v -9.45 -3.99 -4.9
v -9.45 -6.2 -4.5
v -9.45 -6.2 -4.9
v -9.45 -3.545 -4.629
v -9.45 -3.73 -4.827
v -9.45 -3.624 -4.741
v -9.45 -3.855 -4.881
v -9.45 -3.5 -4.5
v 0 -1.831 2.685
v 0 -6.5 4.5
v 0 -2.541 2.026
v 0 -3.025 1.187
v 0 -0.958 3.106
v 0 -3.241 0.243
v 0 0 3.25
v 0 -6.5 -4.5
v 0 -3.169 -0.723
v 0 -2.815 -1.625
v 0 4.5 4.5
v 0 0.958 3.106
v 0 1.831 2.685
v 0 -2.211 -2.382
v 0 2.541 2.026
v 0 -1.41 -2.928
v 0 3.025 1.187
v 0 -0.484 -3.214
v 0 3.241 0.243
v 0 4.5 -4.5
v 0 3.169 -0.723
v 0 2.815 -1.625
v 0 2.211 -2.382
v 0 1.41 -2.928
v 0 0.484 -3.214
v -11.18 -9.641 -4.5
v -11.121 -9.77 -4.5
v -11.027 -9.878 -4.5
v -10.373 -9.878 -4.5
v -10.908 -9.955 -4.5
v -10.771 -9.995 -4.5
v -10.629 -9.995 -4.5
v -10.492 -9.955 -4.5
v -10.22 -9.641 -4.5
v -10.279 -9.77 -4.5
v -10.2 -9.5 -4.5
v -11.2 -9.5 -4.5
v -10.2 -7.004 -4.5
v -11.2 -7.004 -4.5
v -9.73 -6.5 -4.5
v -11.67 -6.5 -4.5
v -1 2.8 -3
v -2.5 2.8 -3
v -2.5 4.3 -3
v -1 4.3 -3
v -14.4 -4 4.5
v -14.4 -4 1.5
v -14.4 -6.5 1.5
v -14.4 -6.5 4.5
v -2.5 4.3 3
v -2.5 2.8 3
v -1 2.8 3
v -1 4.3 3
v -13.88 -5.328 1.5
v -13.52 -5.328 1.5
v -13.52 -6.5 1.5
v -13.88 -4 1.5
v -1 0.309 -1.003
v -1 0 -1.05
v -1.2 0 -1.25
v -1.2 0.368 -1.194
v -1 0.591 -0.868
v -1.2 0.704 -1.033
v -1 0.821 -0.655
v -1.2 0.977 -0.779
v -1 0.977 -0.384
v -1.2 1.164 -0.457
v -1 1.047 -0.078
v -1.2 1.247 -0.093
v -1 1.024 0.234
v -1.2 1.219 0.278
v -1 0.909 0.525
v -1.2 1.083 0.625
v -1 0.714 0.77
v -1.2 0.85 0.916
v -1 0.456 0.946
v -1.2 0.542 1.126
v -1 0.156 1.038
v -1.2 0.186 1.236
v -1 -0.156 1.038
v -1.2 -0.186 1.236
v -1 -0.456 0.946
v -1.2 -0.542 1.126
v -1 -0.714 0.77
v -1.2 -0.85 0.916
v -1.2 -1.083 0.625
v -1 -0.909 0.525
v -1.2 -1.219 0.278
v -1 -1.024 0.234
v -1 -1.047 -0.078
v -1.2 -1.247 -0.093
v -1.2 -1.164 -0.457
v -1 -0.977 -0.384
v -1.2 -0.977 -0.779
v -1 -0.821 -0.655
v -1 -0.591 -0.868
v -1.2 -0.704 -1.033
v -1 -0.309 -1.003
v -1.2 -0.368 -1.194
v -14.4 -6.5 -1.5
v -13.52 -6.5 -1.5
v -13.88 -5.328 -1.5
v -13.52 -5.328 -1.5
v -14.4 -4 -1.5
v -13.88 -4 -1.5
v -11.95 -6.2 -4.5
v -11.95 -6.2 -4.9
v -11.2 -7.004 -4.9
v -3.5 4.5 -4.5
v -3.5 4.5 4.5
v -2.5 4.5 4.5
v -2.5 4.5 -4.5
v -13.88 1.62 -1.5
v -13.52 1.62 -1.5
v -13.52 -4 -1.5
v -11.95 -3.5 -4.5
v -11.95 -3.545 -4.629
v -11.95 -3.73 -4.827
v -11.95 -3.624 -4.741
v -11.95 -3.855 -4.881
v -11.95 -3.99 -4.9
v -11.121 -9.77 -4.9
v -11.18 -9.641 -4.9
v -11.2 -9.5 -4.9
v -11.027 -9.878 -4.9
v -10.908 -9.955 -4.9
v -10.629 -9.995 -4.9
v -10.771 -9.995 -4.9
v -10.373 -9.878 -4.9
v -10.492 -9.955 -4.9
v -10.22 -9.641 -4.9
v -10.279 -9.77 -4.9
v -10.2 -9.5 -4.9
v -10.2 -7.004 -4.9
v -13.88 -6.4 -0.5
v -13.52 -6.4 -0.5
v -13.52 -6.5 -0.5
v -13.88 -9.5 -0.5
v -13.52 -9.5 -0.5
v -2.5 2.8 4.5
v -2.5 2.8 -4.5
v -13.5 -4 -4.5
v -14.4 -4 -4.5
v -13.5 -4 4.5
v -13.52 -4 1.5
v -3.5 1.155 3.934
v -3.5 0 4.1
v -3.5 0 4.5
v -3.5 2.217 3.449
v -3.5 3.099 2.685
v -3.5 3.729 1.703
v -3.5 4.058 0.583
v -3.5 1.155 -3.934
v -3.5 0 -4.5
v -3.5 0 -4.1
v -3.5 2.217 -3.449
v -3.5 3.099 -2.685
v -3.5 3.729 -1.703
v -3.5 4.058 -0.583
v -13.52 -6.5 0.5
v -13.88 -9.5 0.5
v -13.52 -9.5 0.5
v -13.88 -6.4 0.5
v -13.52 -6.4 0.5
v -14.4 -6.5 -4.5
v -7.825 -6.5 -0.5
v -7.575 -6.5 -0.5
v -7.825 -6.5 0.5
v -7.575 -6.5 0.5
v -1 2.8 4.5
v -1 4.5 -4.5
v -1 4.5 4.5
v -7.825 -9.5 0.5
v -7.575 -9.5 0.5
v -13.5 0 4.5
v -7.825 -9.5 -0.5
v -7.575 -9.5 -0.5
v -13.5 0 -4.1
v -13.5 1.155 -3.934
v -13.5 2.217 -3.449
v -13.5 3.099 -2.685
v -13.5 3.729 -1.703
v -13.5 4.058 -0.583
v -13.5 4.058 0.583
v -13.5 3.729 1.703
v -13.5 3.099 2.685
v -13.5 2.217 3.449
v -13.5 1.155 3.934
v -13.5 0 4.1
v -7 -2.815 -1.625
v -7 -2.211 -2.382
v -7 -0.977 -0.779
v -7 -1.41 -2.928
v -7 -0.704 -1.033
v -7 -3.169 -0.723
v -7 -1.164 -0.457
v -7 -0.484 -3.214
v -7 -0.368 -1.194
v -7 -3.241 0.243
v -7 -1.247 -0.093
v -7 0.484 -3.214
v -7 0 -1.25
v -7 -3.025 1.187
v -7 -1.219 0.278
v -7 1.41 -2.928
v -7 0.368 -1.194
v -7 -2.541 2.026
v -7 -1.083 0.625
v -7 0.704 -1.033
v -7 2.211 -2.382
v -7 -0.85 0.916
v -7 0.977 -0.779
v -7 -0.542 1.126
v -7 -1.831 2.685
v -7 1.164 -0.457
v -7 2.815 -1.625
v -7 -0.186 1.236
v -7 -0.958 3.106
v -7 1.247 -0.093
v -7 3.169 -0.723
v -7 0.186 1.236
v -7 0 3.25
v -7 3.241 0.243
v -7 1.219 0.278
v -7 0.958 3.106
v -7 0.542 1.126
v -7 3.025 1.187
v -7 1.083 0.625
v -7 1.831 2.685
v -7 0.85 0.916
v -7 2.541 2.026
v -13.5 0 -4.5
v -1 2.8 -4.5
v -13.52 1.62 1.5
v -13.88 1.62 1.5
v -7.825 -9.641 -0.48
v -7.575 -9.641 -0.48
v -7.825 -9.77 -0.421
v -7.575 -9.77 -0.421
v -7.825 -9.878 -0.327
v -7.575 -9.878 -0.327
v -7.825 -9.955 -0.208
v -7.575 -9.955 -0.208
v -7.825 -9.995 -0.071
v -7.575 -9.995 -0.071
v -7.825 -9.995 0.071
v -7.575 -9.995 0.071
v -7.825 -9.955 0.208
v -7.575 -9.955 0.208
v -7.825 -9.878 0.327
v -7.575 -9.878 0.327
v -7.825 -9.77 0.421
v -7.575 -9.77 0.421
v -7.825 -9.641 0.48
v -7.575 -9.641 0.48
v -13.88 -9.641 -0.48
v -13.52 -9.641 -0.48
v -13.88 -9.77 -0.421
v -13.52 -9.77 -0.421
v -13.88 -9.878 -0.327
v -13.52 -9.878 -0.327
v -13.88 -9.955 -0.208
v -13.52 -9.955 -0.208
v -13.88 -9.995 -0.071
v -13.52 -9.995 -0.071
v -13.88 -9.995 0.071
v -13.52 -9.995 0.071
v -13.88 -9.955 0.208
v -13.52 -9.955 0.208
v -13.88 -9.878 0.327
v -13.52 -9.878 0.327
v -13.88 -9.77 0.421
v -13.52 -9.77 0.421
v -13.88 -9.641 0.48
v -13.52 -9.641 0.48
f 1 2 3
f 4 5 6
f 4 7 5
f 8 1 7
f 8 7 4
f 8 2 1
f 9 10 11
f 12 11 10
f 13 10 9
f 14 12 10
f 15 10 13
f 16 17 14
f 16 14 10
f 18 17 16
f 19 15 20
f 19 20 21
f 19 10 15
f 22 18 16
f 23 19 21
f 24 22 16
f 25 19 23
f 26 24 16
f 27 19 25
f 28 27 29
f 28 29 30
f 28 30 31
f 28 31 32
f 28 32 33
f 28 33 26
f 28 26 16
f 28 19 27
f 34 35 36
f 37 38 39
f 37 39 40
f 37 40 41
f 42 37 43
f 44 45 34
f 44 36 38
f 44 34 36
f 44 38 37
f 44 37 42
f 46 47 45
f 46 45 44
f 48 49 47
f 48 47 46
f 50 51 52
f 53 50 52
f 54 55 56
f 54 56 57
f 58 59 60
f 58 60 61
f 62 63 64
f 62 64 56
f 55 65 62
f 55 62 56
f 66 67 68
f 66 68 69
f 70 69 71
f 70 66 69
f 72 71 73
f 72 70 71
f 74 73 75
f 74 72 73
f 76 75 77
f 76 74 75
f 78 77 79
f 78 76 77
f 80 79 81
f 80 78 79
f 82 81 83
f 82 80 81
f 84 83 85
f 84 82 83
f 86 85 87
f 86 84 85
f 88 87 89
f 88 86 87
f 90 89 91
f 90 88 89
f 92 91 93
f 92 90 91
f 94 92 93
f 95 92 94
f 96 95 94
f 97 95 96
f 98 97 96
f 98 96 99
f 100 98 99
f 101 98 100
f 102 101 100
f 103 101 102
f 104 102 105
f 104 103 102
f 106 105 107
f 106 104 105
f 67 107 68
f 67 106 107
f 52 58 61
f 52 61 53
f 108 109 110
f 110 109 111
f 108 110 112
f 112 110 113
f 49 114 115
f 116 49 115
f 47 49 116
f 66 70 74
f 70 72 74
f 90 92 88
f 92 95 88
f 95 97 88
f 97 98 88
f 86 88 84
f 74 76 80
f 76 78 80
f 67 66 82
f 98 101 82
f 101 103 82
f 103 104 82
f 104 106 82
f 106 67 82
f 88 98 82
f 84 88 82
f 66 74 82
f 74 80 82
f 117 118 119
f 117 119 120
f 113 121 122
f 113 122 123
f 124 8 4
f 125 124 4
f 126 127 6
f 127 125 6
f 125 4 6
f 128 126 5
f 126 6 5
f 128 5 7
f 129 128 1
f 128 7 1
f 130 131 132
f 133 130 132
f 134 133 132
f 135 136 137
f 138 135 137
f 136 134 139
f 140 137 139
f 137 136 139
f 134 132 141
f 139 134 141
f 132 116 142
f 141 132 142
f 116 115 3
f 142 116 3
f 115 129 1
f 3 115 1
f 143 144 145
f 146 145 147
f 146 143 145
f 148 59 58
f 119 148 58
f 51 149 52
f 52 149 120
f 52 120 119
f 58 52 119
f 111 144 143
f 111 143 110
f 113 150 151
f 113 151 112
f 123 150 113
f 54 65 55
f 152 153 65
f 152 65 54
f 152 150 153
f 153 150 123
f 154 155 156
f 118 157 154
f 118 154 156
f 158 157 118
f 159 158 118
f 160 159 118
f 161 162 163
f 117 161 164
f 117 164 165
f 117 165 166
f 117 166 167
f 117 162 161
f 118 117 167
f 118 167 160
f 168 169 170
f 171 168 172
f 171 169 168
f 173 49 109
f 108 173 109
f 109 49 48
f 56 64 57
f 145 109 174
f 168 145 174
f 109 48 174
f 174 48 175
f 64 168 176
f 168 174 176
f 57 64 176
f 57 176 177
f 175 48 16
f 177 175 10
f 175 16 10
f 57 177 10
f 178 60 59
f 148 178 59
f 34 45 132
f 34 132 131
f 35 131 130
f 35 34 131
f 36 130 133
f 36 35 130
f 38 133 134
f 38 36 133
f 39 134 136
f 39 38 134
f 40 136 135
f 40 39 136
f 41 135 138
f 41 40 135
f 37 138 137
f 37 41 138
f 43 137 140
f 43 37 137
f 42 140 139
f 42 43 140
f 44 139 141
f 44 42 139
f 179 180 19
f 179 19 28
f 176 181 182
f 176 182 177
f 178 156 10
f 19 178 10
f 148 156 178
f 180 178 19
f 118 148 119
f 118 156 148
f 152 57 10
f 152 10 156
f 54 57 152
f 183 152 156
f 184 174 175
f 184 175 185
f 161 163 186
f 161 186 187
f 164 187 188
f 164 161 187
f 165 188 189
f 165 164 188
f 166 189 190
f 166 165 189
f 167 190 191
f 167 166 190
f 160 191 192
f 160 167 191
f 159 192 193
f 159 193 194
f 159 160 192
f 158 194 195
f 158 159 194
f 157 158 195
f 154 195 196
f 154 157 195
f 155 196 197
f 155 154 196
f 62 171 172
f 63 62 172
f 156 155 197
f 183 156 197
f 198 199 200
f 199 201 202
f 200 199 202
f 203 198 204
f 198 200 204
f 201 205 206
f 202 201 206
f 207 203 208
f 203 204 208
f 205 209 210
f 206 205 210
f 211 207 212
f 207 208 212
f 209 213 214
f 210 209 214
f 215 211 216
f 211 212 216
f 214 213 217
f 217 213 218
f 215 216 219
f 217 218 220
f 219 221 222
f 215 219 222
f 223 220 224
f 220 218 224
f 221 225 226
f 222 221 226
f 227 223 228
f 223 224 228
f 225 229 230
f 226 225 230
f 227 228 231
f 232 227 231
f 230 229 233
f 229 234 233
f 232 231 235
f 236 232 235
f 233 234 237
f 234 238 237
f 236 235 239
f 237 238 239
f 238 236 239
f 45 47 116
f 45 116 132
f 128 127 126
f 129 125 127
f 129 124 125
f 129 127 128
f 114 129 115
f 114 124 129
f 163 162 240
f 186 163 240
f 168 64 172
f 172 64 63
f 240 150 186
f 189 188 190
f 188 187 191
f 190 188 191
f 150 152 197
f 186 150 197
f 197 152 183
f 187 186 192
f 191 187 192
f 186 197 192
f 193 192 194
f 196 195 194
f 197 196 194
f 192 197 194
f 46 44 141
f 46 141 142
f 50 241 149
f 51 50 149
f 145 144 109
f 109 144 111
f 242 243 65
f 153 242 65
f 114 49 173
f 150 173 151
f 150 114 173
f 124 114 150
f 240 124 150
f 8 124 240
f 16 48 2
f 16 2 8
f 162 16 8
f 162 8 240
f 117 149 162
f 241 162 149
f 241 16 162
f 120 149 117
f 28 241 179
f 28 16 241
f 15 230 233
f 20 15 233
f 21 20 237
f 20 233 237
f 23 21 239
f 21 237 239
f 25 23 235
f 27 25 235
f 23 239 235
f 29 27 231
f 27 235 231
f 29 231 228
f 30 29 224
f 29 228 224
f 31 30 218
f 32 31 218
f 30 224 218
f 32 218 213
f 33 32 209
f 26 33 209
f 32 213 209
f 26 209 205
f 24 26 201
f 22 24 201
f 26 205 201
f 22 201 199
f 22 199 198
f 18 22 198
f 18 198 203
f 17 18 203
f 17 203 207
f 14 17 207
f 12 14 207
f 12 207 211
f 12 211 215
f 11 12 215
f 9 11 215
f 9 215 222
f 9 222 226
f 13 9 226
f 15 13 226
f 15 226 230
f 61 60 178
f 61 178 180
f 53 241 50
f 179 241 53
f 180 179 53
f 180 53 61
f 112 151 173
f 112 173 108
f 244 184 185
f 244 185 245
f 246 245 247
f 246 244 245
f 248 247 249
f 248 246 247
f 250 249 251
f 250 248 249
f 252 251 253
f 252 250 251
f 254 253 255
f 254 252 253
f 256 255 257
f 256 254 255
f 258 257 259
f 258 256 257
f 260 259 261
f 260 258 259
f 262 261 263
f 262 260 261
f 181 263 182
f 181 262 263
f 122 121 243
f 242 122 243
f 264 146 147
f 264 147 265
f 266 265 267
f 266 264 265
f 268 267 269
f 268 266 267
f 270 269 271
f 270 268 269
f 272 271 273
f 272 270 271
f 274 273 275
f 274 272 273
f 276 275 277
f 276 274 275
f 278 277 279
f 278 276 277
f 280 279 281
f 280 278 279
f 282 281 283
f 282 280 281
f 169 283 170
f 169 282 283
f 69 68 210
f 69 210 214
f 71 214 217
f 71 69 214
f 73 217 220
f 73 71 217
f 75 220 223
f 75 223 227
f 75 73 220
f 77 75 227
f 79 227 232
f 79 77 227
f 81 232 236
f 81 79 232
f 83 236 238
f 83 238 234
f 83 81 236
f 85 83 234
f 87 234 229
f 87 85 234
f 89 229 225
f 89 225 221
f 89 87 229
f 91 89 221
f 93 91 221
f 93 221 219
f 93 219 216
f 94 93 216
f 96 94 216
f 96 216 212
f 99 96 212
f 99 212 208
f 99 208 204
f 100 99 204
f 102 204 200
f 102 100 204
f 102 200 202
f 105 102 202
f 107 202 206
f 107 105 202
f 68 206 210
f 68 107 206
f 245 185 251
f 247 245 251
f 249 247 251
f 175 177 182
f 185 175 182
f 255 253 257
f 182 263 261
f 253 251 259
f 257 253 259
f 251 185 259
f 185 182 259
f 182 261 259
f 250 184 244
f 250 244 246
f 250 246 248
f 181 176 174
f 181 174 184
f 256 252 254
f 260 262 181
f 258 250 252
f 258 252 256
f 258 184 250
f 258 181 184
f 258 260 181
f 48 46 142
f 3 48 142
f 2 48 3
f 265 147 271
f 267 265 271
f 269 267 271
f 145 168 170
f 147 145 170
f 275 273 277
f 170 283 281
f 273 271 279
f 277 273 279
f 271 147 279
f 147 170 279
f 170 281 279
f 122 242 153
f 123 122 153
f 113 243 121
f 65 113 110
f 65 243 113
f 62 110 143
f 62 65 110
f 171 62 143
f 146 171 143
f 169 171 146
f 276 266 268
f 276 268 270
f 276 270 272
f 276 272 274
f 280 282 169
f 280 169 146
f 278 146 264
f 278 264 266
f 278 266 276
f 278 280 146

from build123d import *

# Parameters (mm, degrees)
SKETCH1_W                      = 11
SKETCH1_H                      = 9
BOSS_EXTRUDE1_DEPTH            = 2.5
BOSS_EXTRUDE2_DEPTH            = 0.4
CUT_EXTRUDE1_DEPTH             = 12.41315031
SKETCH4_W                      = 9
SKETCH4_H                      = 11
BOSS_EXTRUDE3_DEPTH            = 2.45
SKETCH5_W                      = 9
SKETCH5_H                      = 11
BOSS_EXTRUDE4_DEPTH            = 9.45
SKETCH6_W                      = 0.9
SKETCH6_H                      = 8.5
CUT_EXTRUDE2_DEPTH             = 20.892712233
SKETCH7_W                      = 0.52
SKETCH7_H                      = 6
CUT_EXTRUDE3_DEPTH             = 18.424695119
SKETCH8_W                      = 5.62
SKETCH8_H                      = 3
BOSS_EXTRUDE5_DEPTH            = 0.36
SKETCH9_W                      = 3
SKETCH9_H                      = 2.5
BOSS_EXTRUDE6_DEPTH            = 0.52
CUT_EXTRUDE4_REACH             = 19.516
SKETCH11_W                     = 1
SKETCH11_H                     = 0.1
BOSS_EXTRUDE7_DEPTH            = 0.36
CUT_EXTRUDE5_REACH             = 20.109
SKETCH14_W                     = 0.36
SKETCH14_H                     = 1
SKETCH15_W                     = 10
SKETCH15_H                     = 4.5
CUT_EXTRUDE6_DEPTH             = 20.7068516
BOSS_EXTRUDE8_DEPTH            = 10
SKETCH17_W                     = 1.5
SKETCH17_H                     = 1.7
CUT_EXTRUDE7_DEPTH             = 20.7068516
SKETCH18_W                     = 6
SKETCH18_H                     = 1.5
BOSS_EXTRUDE9_DEPTH            = 1.5
BOSS_EXTRUDE10_DEPTH           = 0.25
F_6_5_6_5_DIAMETER_HOLE1_D     = 6.5
F_6_5_6_5_DIAMETER_HOLE1_DEPTH = 7
DRAFT1_ANGLE                   = -47
DRAFT2_ANGLE                   = 47
SKETCH22_W                     = 6
SKETCH22_H                     = 1.25
CHAMFER1_SIZE                  = 0.2


with BuildPart() as part:
    # Sketch1 → Boss-Extrude1 (new body)
    with BuildSketch(Plane(origin=(-11.95, 0, 0), x_dir=(0, -1, 0), z_dir=(-1, 0, 0))):
        with Locations((1, 0)):
            Rectangle(SKETCH1_W, SKETCH1_H)
    extrude(amount=-BOSS_EXTRUDE1_DEPTH)

    # Sketch2 → Boss-Extrude2 (add)
    with BuildSketch(Plane(origin=(0, 0, -4.5), x_dir=(-1, 0, 0), z_dir=(0, 0, -1))):
        with BuildLine():
            Line((10.2, -9.5), (10.2, -7.004276533))
            Line((10.2, -7.004276533), (9.45, -6.2))
            Line((9.45, -6.2), (9.45, 4.5))
            Line((9.45, 4.5), (11.95, 4.5))
            Line((11.95, 4.5), (11.95, -6.2))
            Line((11.95, -6.2), (11.2, -7.004276533))
            Line((11.2, -7.004276533), (11.2, -9.5))
            ThreePointArc((11.2, -9.5), (10.7, -10), (10.2, -9.5))
        make_face()
    extrude(amount=BOSS_EXTRUDE2_DEPTH)

    # Sketch3 → Cut-Extrude1 (cut, through all)
    with BuildSketch(Plane(origin=(-9.45, 0, 0), x_dir=(0, 0, -1), z_dir=(1, 0, 0))):
        with BuildLine():
            Line((4.9, 4.5), (4.5, 4.5))
            Line((4.5, 4.5), (4.5, -3.5))
            ThreePointArc((4.5, -3.5), (4.787298335, -3.673670183), (4.9, -3.989897949))
            Line((4.9, -3.989897949), (4.9, 4.5))
        make_face()
    extrude(amount=-CUT_EXTRUDE1_DEPTH, mode=Mode.SUBTRACT)

    # Sketch4 → Boss-Extrude3 (add)
    with BuildSketch(Plane.ZY.offset(11.95)):
        with Locations((0, -1)):
            Rectangle(SKETCH4_W, SKETCH4_H)
    extrude(amount=BOSS_EXTRUDE3_DEPTH)

    # Sketch5 → Boss-Extrude4 (add)
    with BuildSketch(Plane(origin=(-9.45, 0, 0), x_dir=(0, 0, -1), z_dir=(1, 0, 0))):
        with Locations((0, -1)):
            Rectangle(SKETCH5_W, SKETCH5_H)
    extrude(amount=BOSS_EXTRUDE4_DEPTH)

    # Sketch6 → Cut-Extrude2 (cut, through all)
    with BuildSketch(Plane.XY.offset(4.5)):
        with Locations((-13.95, 0.25)):
            Rectangle(SKETCH6_W, SKETCH6_H)
    extrude(amount=-CUT_EXTRUDE2_DEPTH, mode=Mode.SUBTRACT)

    # Sketch7 → Cut-Extrude3 (cut, through all)
    with BuildSketch(Plane(origin=(0, -4, 0), x_dir=(-1, 0, 0), z_dir=(0, 1, 0))):
        with Locations((14.14, -1.5)):
            Rectangle(SKETCH7_W, SKETCH7_H)
    extrude(amount=-CUT_EXTRUDE3_DEPTH, mode=Mode.SUBTRACT)

    # Sketch8 → Boss-Extrude5 (add)
    with BuildSketch(Plane(origin=(-13.88, 0, 0), x_dir=(0, -1, 0), z_dir=(-1, 0, 0))):
        with Locations((1.19, 0)):
            Rectangle(SKETCH8_W, SKETCH8_H)
    extrude(amount=-BOSS_EXTRUDE5_DEPTH)

    # Sketch9 → Boss-Extrude6 (add)
    with BuildSketch(Plane.ZY.offset(13.88)):
        with Locations((-3, -5.25)):
            Rectangle(SKETCH9_W, SKETCH9_H)
    extrude(amount=BOSS_EXTRUDE6_DEPTH)

    # Sketch11 → Cut-Extrude4 (cut, up to next)
    with BuildSketch(Plane(origin=(-13.52, 0, 0), x_dir=(0, 0, -1), z_dir=(1, 0, 0)), mode=Mode.PRIVATE) as cut_extrude4_sk1:
        with Locations((1, -6.45)):
            Rectangle(SKETCH11_W, SKETCH11_H)
    cut_extrude4_tool1 = extrude(cut_extrude4_sk1.sketch, amount=-CUT_EXTRUDE4_REACH, mode=Mode.PRIVATE) & part.part
    add(cut_extrude4_tool1.solids().sort_by_distance((-13.52, -6.45, -1))[0], mode=Mode.SUBTRACT)

    # Sketch12 → Boss-Extrude7 (add)
    with BuildSketch(Plane(origin=(-13.88, 0, 0), x_dir=(0, -1, 0), z_dir=(-1, 0, 0))):
        with BuildLine():
            Line((9.5, 0.5), (6.5, 0.5))
            Line((6.5, 0.5), (6.5, -0.5))
            Line((6.5, -0.5), (9.5, -0.5))
            ThreePointArc((9.5, -0.5), (10, 0), (9.5, 0.5))
        make_face()
    extrude(amount=-BOSS_EXTRUDE7_DEPTH)

    # Sketch14 → Cut-Extrude5 (cut, up to next)
    with BuildSketch(Plane(origin=(0, -5.32763129, 0), x_dir=(1, 0, 0), z_dir=(0, 1, 0)), mode=Mode.PRIVATE) as cut_extrude5_sk1:
        with Locations((-13.7, -1)):
            Rectangle(SKETCH14_W, SKETCH14_H)
    cut_extrude5_tool1 = extrude(cut_extrude5_sk1.sketch, amount=-CUT_EXTRUDE5_REACH, mode=Mode.PRIVATE) & part.part
    add(cut_extrude5_tool1.solids().sort_by_distance((-13.7, -5.327631, 1))[0], mode=Mode.SUBTRACT)

    # Sketch15 → Cut-Extrude6 (cut, through all)
    with BuildSketch(Plane(origin=(0, 0, -4.5), x_dir=(-1, 0, 0), z_dir=(0, 0, -1))):
        with Locations((8.5, 2.25)):
            Rectangle(SKETCH15_W, SKETCH15_H)
    extrude(amount=-CUT_EXTRUDE6_DEPTH, mode=Mode.SUBTRACT)

    # Sketch16 → Boss-Extrude8 (add)
    with BuildSketch(Plane.ZY.offset(3.5)):
        with BuildLine():
            Line((4.1, 0), (-4.1, 0))
            ThreePointArc((-4.1, 0), (0, 4.1), (4.1, 0))
        make_face()
    extrude(amount=BOSS_EXTRUDE8_DEPTH)

    # Sketch17 → Cut-Extrude7 (cut, through all)
    with BuildSketch(Plane(origin=(0, 0, -4.5), x_dir=(-1, 0, 0), z_dir=(0, 0, -1))):
        with Locations((1.75, 3.65)):
            Rectangle(SKETCH17_W, SKETCH17_H)
    extrude(amount=-CUT_EXTRUDE7_DEPTH, mode=Mode.SUBTRACT)

    # Sketch18 → Boss-Extrude9 (add)
    with BuildSketch(Plane(origin=(-2.5, 0, 0), x_dir=(0, 0, -1), z_dir=(1, 0, 0))):
        with Locations((0, 3.55)):
            Rectangle(SKETCH18_W, SKETCH18_H)
    extrude(amount=BOSS_EXTRUDE9_DEPTH)

    # Sketch19 → Boss-Extrude10 (add)
    with BuildSketch(Plane(origin=(-7.825, 0, 0), x_dir=(0, -1, 0), z_dir=(-1, 0, 0))):
        with BuildLine():
            Line((9.5, 0.5), (6.5, 0.5))
            Line((6.5, 0.5), (6.5, -0.5))
            Line((6.5, -0.5), (9.5, -0.5))
            ThreePointArc((9.5, -0.5), (10, 0), (9.5, 0.5))
        make_face()
    extrude(amount=-BOSS_EXTRUDE10_DEPTH)

    # Ø6.5 (6.5) Diameter Hole1
    with Locations(Plane(origin=(0, 0, 0), x_dir=(0, 0, -1), z_dir=(1, 0, 0))):
        with Locations((0, 0)):
            Hole(F_6_5_6_5_DIAMETER_HOLE1_D / 2, depth=F_6_5_6_5_DIAMETER_HOLE1_DEPTH)

    # Draft1
    draft1_faces = [part.faces().sort_by_distance(p)[0] for p in [
        (-13.7, -5.32763129, 1),
    ]]
    draft(draft1_faces, Plane(origin=(-14.4, -10, 1.5), x_dir=(-1, 0, 0), z_dir=(0, 0, -1)), DRAFT1_ANGLE)

    # Draft2
    draft2_faces = [part.faces().sort_by_distance(p)[0] for p in [
        (-13.7, -6.4, -1),
    ]]
    draft(draft2_faces, Plane(origin=(-14.884987562, -6.4, -0.5), x_dir=(-1, 0, 0), z_dir=(0, 0, -1)), DRAFT2_ANGLE)

    # Sketch22 → Revolve1 (revolve)
    with BuildSketch(Plane.XY, mode=Mode.PRIVATE) as revolve1_sk:
        with Locations((-4, 0.625)):
            Rectangle(SKETCH22_W, SKETCH22_H)
    revolve(revolve1_sk.sketch.rotate(Axis((-7, 0, 0), (1, 0, 0)), 270), axis=Axis((-7, 0, 0), (1, 0, 0)))

    # Chamfer1
    chamfer1_edges = [part.edges().sort_by_distance(p)[0] for p in [
        (-1, 0, 1.25),
    ]]
    chamfer(chamfer1_edges, length=CHAMFER1_SIZE)


solid = part.part
